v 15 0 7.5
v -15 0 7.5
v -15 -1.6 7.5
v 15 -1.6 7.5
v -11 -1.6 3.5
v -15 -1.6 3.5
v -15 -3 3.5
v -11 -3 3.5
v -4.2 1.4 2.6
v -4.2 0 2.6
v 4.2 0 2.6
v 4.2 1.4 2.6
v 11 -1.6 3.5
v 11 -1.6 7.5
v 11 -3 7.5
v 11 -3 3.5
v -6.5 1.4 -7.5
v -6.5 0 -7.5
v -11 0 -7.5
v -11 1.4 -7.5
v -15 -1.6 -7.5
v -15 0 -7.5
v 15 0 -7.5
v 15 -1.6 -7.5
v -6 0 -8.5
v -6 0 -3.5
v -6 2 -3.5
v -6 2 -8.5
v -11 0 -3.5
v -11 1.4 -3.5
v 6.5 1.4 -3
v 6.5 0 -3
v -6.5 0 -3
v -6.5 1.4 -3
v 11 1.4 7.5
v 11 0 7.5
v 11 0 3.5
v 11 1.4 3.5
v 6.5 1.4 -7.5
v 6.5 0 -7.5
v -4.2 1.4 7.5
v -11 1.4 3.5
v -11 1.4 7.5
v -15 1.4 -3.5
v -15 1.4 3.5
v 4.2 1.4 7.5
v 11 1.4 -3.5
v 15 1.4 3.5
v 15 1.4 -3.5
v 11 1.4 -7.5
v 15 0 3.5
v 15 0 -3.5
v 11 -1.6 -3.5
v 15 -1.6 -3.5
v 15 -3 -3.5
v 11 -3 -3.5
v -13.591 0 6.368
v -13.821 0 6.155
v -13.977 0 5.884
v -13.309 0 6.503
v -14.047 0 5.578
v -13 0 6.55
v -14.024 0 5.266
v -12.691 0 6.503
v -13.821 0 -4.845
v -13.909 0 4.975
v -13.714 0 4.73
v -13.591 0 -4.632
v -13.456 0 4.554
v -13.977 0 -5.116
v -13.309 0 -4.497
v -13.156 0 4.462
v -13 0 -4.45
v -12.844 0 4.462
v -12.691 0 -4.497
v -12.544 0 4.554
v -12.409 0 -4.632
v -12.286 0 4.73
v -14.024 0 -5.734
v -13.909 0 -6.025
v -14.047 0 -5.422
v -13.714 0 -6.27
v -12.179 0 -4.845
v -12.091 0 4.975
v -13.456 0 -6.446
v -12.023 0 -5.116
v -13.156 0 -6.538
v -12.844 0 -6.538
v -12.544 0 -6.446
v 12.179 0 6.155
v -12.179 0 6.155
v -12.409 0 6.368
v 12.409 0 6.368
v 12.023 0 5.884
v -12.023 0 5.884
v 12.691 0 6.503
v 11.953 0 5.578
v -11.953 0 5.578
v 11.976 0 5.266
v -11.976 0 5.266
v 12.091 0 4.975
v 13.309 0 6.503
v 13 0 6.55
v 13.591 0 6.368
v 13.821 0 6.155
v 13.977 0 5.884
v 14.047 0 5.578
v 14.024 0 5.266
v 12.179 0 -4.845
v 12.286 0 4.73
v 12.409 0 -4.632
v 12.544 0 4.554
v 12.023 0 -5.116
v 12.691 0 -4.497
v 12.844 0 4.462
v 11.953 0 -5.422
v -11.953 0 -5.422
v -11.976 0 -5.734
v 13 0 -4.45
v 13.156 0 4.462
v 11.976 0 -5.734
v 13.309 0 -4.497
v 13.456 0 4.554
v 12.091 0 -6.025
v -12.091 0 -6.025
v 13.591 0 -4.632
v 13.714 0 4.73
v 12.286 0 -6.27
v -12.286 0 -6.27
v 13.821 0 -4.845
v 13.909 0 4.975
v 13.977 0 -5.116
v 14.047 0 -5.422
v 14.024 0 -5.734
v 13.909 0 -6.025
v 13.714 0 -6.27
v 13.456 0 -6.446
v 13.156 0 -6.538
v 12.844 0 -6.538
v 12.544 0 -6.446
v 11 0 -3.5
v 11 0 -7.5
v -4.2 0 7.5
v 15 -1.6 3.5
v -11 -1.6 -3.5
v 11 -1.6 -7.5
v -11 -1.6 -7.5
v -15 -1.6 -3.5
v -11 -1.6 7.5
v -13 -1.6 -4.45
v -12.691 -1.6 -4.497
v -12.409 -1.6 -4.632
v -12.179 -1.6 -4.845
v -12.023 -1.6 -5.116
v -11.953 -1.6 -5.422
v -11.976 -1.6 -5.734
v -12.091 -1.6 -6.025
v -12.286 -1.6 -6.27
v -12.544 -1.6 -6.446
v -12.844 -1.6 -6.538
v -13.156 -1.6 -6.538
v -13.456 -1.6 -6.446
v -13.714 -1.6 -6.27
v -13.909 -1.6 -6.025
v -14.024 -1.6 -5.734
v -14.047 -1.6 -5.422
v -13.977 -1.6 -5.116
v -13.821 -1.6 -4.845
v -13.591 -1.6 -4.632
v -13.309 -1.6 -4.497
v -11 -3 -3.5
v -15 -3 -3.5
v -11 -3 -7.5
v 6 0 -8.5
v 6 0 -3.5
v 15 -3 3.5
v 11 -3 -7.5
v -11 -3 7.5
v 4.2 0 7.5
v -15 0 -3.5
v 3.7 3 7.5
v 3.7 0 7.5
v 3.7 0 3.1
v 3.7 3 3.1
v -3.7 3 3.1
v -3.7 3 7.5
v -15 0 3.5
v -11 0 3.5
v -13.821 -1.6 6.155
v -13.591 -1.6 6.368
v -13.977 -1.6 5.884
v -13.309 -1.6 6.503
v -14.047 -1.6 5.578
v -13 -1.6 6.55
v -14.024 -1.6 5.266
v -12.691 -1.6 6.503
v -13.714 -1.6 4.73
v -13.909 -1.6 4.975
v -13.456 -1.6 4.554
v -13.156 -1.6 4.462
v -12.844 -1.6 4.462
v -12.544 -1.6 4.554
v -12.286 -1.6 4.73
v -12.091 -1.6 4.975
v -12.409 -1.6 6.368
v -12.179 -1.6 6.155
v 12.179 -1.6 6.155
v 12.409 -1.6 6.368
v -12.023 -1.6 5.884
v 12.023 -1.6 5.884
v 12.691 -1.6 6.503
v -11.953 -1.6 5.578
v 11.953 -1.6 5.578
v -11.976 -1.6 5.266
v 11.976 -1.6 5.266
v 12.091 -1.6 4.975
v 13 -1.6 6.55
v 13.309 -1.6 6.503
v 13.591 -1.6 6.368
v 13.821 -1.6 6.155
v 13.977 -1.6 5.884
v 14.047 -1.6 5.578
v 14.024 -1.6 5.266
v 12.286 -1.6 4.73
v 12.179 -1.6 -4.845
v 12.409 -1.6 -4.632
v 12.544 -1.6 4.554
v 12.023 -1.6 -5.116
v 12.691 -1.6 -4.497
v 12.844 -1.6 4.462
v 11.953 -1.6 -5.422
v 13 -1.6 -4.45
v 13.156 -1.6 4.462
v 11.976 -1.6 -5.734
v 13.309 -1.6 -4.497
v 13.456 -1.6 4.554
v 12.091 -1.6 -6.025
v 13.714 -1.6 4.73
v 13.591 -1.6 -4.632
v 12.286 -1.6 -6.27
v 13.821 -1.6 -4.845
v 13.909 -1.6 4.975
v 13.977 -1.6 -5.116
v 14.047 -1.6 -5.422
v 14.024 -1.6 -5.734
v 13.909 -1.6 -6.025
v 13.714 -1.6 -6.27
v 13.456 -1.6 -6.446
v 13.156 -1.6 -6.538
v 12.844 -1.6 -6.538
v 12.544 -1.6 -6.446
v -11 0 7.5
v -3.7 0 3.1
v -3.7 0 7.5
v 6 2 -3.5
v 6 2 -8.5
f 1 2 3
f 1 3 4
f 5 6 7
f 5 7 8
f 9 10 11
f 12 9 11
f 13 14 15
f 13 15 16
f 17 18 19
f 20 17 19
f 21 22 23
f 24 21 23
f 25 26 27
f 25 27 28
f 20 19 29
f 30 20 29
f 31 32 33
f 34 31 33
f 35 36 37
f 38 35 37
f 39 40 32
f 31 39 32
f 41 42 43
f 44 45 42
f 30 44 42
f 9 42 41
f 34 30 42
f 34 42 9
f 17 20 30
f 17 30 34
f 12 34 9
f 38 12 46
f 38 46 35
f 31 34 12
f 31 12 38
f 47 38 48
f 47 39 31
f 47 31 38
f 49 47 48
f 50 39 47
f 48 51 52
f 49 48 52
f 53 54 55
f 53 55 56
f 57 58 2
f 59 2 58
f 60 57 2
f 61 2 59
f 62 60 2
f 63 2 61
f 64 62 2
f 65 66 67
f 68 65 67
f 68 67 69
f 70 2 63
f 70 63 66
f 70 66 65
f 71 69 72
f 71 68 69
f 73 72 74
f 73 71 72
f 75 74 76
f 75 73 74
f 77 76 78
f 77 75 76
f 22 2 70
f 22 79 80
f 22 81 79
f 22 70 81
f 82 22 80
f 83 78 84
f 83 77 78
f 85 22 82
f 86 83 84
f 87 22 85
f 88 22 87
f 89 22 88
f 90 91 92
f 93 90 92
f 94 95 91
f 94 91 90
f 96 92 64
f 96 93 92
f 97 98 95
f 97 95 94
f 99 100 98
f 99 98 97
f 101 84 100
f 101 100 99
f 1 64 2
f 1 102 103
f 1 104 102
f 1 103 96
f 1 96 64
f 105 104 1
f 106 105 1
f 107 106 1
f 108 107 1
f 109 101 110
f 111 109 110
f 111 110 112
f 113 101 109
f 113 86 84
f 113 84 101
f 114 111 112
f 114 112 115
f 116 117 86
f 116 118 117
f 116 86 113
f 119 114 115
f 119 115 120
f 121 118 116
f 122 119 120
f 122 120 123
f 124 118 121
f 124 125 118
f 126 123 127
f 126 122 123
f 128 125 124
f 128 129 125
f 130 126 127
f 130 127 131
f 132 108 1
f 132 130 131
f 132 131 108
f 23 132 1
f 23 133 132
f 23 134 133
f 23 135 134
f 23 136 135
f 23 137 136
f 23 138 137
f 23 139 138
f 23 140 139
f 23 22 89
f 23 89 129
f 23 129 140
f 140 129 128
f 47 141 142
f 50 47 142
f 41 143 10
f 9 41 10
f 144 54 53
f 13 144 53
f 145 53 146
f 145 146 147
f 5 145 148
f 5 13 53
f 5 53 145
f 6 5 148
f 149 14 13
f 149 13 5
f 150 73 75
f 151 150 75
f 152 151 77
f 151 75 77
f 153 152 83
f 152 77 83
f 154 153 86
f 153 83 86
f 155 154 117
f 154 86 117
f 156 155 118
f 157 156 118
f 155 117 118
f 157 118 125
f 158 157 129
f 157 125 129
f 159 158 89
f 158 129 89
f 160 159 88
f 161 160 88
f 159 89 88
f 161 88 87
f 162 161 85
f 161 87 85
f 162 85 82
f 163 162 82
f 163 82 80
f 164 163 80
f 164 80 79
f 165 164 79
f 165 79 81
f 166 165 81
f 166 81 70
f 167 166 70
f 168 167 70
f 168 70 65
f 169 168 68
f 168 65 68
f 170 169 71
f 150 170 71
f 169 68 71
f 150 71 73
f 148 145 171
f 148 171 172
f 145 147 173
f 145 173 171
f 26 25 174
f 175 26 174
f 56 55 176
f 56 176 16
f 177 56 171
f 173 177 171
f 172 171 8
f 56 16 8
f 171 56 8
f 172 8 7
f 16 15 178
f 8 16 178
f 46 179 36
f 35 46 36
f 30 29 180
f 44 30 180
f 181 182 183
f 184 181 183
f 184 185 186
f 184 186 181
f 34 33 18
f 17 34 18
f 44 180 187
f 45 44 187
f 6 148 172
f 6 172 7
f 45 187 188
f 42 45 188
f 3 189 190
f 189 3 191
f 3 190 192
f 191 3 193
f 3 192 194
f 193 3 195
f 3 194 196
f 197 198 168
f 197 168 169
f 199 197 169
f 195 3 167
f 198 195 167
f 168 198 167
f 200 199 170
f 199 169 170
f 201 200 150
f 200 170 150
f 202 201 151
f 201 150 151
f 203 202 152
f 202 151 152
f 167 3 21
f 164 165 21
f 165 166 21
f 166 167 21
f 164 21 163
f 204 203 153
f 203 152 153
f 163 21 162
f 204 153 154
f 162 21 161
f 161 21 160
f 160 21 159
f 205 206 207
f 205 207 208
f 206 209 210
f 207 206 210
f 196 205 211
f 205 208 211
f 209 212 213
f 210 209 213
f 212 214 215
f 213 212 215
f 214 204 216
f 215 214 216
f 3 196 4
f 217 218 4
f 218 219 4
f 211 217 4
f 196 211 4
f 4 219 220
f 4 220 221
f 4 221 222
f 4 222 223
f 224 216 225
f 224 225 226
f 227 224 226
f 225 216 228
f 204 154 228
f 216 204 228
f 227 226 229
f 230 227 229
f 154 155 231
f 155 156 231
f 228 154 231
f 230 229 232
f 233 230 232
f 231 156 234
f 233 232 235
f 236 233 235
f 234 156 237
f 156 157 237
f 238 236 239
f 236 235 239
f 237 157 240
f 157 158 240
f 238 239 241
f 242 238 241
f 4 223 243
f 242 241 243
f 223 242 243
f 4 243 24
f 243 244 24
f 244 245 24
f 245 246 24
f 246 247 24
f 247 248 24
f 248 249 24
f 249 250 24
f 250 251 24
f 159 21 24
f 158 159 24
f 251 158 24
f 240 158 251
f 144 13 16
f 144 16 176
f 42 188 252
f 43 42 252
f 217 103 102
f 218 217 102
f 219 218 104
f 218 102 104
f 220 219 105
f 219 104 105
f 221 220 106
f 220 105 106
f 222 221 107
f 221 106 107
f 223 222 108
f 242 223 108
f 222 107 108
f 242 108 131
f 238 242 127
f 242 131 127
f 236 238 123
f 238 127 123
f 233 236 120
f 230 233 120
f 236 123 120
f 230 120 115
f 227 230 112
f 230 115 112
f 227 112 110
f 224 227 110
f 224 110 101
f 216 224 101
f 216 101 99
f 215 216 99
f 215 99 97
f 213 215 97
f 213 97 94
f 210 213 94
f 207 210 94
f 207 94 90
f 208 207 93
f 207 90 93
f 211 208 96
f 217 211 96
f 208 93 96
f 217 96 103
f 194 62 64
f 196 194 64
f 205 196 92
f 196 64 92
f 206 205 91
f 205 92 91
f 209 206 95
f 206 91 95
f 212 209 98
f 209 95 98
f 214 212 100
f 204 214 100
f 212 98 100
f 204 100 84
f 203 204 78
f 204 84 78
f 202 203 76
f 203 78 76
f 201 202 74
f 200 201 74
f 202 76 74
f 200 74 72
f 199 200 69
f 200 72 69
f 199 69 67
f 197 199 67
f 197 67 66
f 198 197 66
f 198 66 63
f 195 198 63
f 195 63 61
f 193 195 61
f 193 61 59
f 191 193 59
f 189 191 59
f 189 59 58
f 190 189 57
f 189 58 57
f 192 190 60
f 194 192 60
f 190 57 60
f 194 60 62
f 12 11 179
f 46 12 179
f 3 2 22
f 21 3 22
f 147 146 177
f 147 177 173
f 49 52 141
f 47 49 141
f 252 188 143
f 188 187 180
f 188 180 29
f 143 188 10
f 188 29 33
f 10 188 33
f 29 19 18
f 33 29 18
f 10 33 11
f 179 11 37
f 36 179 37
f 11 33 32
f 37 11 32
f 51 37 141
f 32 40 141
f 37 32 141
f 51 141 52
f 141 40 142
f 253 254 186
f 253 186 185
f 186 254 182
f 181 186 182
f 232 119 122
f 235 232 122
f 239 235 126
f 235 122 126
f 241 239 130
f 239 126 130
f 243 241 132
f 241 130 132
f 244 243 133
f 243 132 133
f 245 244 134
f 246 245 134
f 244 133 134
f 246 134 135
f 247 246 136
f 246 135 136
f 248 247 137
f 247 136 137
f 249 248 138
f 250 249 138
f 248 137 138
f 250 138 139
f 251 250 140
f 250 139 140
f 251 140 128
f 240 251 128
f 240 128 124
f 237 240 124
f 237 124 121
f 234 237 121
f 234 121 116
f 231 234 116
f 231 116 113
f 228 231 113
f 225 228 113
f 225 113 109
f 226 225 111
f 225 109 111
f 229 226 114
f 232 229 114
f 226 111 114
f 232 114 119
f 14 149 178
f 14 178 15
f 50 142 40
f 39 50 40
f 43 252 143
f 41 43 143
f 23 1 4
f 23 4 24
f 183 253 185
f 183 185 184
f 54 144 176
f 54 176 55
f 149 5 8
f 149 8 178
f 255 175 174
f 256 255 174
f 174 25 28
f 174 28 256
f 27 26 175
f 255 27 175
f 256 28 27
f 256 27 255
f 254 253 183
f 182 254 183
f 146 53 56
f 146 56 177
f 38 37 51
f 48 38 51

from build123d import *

# Parameters (mm, degrees)
SKETCH1_W           = 30
SKETCH1_H           = 15
SKETCH1_R           = 1.05
BOSS_EXTRUDE1_DEPTH = 1.6
SKETCH2_W           = 12
SKETCH2_H           = 5
BOSS_EXTRUDE2_DEPTH = 2
SKETCH3_W           = 7.4
SKETCH3_H           = 4.4
BOSS_EXTRUDE3_DEPTH = 3
BOSS_EXTRUDE4_DEPTH = 1.4
BOSS_EXTRUDE5_DEPTH = 1.4


with BuildPart() as part:
    # Sketch1 → Boss-Extrude1 (new body)
    with BuildSketch(Plane(origin=(0, 0, 0), x_dir=(1, 0, 0), z_dir=(0, 1, 0))):
        Rectangle(SKETCH1_W, SKETCH1_H)
        with Locations(Location((13, 5.5, 0), (0, 0, 270))):
            Circle(SKETCH1_R, mode=Mode.SUBTRACT)
        with Locations(Location((13, -5.5, 0), (0, 0, 270))):
            Circle(SKETCH1_R, mode=Mode.SUBTRACT)
        with Locations(Location((-13, -5.5, 0), (0, 0, 270))):
            Circle(SKETCH1_R, mode=Mode.SUBTRACT)
        with Locations(Location((-13, 5.5, 0), (0, 0, 270))):
            Circle(SKETCH1_R, mode=Mode.SUBTRACT)
    extrude(amount=-BOSS_EXTRUDE1_DEPTH)


with BuildPart() as body_2:
    # Sketch2 → Boss-Extrude2 (new body)
    with BuildSketch(Plane(origin=(0, 0, 0), x_dir=(1, 0, 0), z_dir=(0, 1, 0))):
        with Locations((0, 6)):
            Rectangle(SKETCH2_W, SKETCH2_H)
    extrude(amount=BOSS_EXTRUDE2_DEPTH)


with BuildPart() as body_3:
    # Sketch3 → Boss-Extrude3 (new body)
    with BuildSketch(Plane(origin=(0, 0, 0), x_dir=(1, 0, 0), z_dir=(0, 1, 0))):
        with Locations((0, -5.3)):
            Rectangle(SKETCH3_W, SKETCH3_H)
    extrude(amount=BOSS_EXTRUDE3_DEPTH)


with BuildPart() as body_4:
    # Sketch4 → Boss-Extrude4 (new body)
    with BuildSketch(Plane.XZ.offset(1.6)):
        Polygon((-15, 3.5), (-11, 3.5), (-11, 7.5), (11, 7.5), (11, 3.5), (15, 3.5), (15, -3.5), (11, -3.5), (11, -7.5), (-11, -7.5), (-11, -3.5), (-15, -3.5), align=None)
    extrude(amount=BOSS_EXTRUDE4_DEPTH)


with BuildPart() as body_5:
    # Sketch5 → Boss-Extrude5 (new body)
    with BuildSketch(Plane(origin=(0, 0, 0), x_dir=(1, 0, 0), z_dir=(0, 1, 0))):
        Polygon((-11, -3.5), (-11, -7.5), (-4.2, -7.5), (-4.2, -2.6), (4.2, -2.6), (4.2, -7.5), (11, -7.5), (11, -3.5), (15, -3.5), (15, 3.5), (11, 3.5), (11, 7.5), (6.5, 7.5), (6.5, 3), (-6.5, 3), (-6.5, 7.5), (-11, 7.5), (-11, 3.5), (-15, 3.5), (-15, -3.5), align=None)
    extrude(amount=BOSS_EXTRUDE5_DEPTH)


solid = Compound([part.part, body_2.part, body_3.part, body_4.part, body_5.part])
